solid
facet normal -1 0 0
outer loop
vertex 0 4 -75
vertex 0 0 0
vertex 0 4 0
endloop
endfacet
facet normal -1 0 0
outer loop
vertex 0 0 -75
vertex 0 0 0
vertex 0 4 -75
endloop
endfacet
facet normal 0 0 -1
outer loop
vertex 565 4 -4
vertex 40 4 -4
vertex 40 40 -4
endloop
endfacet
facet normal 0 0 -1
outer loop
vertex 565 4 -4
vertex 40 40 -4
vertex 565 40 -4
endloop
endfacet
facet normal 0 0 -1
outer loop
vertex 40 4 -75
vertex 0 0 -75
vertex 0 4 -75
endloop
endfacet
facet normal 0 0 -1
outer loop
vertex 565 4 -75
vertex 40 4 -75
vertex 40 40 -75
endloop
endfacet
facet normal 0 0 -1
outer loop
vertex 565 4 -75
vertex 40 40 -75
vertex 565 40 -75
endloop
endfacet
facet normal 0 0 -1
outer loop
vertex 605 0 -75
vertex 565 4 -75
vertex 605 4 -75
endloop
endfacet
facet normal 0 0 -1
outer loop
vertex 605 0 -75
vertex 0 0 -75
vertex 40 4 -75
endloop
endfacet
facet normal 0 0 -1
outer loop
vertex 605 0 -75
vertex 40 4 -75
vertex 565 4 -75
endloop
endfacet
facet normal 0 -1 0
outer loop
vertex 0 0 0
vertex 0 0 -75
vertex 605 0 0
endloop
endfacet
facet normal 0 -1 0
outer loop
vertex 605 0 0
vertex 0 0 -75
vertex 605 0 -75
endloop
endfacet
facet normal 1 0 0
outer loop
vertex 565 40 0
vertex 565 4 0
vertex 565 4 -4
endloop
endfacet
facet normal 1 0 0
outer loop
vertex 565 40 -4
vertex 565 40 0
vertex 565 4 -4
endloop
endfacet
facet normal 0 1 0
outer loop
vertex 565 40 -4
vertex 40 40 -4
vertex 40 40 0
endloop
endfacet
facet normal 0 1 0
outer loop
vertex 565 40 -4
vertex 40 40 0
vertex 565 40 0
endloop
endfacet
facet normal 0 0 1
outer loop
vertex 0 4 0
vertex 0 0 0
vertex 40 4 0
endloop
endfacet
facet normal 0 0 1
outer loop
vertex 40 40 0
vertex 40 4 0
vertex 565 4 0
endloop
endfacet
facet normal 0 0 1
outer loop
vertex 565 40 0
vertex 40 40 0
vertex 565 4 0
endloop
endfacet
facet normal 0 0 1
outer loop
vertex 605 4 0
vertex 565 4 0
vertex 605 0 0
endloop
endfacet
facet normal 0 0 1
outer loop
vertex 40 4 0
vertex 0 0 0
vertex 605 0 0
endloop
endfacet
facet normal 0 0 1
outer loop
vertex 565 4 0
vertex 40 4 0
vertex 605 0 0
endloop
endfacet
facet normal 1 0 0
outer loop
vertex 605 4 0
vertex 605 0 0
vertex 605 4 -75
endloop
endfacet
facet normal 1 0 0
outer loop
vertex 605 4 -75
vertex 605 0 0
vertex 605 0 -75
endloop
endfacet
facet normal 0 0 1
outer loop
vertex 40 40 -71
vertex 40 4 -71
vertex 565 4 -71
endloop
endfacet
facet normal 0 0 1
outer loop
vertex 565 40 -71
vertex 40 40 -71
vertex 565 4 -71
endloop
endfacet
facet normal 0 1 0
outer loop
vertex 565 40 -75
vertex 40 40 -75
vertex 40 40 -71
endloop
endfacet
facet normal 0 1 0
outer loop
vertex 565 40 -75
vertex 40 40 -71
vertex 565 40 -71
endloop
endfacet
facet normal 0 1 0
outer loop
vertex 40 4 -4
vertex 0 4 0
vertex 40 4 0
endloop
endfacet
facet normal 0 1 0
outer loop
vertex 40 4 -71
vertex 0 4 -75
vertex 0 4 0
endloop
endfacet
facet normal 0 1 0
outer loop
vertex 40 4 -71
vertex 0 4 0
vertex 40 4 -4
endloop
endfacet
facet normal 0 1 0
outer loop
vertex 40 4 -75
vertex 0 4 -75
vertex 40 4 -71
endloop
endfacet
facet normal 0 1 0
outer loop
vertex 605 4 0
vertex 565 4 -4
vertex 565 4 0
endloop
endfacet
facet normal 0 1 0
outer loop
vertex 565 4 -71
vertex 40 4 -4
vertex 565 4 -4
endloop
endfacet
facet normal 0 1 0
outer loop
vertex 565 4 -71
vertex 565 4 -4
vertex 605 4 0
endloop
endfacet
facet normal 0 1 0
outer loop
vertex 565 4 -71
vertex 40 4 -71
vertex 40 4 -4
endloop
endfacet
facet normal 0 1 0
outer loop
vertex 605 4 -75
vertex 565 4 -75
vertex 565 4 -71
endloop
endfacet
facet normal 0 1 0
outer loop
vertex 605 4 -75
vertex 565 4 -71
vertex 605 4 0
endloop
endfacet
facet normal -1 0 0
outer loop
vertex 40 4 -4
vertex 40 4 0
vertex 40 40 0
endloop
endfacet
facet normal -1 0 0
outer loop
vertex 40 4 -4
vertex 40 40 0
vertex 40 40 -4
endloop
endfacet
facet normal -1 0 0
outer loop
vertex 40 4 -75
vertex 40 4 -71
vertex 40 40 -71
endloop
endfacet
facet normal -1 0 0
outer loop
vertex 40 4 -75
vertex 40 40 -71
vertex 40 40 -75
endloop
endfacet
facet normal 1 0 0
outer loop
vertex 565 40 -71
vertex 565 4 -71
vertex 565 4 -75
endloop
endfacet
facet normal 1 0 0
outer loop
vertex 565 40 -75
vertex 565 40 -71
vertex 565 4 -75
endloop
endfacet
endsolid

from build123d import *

# Parameters (mm, degrees)
SKETCH_2_W      = 605
SKETCH_2_H      = 75
EXTRUDE_1_DEPTH = 4
EXTRUDE_START   = -4
SKETCH_3_W      = 525
SKETCH_3_H      = 4
EXTRUDE_2_DEPTH = 40


with BuildPart() as part:
    # 스케치2 → 보스-돌출1 (new body)
    with BuildSketch(Plane(origin=(0, 0, 0), x_dir=(1, 0, 0), z_dir=(0, 1, 0))):
        with Locations((302.5, 37.5)):
            Rectangle(SKETCH_2_W, SKETCH_2_H)
    extrude(amount=EXTRUDE_1_DEPTH)

    # 스케치3 → 보스-돌출2 (add)
    with BuildSketch(Plane(origin=(0, 4, 0), x_dir=(1, 0, 0), z_dir=(0, 1, 0)).offset(EXTRUDE_START)):
        with Locations((302.5, 2)):
            Rectangle(SKETCH_3_W, SKETCH_3_H)
        with Locations((302.5, 73)):
            Rectangle(SKETCH_3_W, SKETCH_3_H)
    extrude(amount=EXTRUDE_2_DEPTH)


solid = part.part
